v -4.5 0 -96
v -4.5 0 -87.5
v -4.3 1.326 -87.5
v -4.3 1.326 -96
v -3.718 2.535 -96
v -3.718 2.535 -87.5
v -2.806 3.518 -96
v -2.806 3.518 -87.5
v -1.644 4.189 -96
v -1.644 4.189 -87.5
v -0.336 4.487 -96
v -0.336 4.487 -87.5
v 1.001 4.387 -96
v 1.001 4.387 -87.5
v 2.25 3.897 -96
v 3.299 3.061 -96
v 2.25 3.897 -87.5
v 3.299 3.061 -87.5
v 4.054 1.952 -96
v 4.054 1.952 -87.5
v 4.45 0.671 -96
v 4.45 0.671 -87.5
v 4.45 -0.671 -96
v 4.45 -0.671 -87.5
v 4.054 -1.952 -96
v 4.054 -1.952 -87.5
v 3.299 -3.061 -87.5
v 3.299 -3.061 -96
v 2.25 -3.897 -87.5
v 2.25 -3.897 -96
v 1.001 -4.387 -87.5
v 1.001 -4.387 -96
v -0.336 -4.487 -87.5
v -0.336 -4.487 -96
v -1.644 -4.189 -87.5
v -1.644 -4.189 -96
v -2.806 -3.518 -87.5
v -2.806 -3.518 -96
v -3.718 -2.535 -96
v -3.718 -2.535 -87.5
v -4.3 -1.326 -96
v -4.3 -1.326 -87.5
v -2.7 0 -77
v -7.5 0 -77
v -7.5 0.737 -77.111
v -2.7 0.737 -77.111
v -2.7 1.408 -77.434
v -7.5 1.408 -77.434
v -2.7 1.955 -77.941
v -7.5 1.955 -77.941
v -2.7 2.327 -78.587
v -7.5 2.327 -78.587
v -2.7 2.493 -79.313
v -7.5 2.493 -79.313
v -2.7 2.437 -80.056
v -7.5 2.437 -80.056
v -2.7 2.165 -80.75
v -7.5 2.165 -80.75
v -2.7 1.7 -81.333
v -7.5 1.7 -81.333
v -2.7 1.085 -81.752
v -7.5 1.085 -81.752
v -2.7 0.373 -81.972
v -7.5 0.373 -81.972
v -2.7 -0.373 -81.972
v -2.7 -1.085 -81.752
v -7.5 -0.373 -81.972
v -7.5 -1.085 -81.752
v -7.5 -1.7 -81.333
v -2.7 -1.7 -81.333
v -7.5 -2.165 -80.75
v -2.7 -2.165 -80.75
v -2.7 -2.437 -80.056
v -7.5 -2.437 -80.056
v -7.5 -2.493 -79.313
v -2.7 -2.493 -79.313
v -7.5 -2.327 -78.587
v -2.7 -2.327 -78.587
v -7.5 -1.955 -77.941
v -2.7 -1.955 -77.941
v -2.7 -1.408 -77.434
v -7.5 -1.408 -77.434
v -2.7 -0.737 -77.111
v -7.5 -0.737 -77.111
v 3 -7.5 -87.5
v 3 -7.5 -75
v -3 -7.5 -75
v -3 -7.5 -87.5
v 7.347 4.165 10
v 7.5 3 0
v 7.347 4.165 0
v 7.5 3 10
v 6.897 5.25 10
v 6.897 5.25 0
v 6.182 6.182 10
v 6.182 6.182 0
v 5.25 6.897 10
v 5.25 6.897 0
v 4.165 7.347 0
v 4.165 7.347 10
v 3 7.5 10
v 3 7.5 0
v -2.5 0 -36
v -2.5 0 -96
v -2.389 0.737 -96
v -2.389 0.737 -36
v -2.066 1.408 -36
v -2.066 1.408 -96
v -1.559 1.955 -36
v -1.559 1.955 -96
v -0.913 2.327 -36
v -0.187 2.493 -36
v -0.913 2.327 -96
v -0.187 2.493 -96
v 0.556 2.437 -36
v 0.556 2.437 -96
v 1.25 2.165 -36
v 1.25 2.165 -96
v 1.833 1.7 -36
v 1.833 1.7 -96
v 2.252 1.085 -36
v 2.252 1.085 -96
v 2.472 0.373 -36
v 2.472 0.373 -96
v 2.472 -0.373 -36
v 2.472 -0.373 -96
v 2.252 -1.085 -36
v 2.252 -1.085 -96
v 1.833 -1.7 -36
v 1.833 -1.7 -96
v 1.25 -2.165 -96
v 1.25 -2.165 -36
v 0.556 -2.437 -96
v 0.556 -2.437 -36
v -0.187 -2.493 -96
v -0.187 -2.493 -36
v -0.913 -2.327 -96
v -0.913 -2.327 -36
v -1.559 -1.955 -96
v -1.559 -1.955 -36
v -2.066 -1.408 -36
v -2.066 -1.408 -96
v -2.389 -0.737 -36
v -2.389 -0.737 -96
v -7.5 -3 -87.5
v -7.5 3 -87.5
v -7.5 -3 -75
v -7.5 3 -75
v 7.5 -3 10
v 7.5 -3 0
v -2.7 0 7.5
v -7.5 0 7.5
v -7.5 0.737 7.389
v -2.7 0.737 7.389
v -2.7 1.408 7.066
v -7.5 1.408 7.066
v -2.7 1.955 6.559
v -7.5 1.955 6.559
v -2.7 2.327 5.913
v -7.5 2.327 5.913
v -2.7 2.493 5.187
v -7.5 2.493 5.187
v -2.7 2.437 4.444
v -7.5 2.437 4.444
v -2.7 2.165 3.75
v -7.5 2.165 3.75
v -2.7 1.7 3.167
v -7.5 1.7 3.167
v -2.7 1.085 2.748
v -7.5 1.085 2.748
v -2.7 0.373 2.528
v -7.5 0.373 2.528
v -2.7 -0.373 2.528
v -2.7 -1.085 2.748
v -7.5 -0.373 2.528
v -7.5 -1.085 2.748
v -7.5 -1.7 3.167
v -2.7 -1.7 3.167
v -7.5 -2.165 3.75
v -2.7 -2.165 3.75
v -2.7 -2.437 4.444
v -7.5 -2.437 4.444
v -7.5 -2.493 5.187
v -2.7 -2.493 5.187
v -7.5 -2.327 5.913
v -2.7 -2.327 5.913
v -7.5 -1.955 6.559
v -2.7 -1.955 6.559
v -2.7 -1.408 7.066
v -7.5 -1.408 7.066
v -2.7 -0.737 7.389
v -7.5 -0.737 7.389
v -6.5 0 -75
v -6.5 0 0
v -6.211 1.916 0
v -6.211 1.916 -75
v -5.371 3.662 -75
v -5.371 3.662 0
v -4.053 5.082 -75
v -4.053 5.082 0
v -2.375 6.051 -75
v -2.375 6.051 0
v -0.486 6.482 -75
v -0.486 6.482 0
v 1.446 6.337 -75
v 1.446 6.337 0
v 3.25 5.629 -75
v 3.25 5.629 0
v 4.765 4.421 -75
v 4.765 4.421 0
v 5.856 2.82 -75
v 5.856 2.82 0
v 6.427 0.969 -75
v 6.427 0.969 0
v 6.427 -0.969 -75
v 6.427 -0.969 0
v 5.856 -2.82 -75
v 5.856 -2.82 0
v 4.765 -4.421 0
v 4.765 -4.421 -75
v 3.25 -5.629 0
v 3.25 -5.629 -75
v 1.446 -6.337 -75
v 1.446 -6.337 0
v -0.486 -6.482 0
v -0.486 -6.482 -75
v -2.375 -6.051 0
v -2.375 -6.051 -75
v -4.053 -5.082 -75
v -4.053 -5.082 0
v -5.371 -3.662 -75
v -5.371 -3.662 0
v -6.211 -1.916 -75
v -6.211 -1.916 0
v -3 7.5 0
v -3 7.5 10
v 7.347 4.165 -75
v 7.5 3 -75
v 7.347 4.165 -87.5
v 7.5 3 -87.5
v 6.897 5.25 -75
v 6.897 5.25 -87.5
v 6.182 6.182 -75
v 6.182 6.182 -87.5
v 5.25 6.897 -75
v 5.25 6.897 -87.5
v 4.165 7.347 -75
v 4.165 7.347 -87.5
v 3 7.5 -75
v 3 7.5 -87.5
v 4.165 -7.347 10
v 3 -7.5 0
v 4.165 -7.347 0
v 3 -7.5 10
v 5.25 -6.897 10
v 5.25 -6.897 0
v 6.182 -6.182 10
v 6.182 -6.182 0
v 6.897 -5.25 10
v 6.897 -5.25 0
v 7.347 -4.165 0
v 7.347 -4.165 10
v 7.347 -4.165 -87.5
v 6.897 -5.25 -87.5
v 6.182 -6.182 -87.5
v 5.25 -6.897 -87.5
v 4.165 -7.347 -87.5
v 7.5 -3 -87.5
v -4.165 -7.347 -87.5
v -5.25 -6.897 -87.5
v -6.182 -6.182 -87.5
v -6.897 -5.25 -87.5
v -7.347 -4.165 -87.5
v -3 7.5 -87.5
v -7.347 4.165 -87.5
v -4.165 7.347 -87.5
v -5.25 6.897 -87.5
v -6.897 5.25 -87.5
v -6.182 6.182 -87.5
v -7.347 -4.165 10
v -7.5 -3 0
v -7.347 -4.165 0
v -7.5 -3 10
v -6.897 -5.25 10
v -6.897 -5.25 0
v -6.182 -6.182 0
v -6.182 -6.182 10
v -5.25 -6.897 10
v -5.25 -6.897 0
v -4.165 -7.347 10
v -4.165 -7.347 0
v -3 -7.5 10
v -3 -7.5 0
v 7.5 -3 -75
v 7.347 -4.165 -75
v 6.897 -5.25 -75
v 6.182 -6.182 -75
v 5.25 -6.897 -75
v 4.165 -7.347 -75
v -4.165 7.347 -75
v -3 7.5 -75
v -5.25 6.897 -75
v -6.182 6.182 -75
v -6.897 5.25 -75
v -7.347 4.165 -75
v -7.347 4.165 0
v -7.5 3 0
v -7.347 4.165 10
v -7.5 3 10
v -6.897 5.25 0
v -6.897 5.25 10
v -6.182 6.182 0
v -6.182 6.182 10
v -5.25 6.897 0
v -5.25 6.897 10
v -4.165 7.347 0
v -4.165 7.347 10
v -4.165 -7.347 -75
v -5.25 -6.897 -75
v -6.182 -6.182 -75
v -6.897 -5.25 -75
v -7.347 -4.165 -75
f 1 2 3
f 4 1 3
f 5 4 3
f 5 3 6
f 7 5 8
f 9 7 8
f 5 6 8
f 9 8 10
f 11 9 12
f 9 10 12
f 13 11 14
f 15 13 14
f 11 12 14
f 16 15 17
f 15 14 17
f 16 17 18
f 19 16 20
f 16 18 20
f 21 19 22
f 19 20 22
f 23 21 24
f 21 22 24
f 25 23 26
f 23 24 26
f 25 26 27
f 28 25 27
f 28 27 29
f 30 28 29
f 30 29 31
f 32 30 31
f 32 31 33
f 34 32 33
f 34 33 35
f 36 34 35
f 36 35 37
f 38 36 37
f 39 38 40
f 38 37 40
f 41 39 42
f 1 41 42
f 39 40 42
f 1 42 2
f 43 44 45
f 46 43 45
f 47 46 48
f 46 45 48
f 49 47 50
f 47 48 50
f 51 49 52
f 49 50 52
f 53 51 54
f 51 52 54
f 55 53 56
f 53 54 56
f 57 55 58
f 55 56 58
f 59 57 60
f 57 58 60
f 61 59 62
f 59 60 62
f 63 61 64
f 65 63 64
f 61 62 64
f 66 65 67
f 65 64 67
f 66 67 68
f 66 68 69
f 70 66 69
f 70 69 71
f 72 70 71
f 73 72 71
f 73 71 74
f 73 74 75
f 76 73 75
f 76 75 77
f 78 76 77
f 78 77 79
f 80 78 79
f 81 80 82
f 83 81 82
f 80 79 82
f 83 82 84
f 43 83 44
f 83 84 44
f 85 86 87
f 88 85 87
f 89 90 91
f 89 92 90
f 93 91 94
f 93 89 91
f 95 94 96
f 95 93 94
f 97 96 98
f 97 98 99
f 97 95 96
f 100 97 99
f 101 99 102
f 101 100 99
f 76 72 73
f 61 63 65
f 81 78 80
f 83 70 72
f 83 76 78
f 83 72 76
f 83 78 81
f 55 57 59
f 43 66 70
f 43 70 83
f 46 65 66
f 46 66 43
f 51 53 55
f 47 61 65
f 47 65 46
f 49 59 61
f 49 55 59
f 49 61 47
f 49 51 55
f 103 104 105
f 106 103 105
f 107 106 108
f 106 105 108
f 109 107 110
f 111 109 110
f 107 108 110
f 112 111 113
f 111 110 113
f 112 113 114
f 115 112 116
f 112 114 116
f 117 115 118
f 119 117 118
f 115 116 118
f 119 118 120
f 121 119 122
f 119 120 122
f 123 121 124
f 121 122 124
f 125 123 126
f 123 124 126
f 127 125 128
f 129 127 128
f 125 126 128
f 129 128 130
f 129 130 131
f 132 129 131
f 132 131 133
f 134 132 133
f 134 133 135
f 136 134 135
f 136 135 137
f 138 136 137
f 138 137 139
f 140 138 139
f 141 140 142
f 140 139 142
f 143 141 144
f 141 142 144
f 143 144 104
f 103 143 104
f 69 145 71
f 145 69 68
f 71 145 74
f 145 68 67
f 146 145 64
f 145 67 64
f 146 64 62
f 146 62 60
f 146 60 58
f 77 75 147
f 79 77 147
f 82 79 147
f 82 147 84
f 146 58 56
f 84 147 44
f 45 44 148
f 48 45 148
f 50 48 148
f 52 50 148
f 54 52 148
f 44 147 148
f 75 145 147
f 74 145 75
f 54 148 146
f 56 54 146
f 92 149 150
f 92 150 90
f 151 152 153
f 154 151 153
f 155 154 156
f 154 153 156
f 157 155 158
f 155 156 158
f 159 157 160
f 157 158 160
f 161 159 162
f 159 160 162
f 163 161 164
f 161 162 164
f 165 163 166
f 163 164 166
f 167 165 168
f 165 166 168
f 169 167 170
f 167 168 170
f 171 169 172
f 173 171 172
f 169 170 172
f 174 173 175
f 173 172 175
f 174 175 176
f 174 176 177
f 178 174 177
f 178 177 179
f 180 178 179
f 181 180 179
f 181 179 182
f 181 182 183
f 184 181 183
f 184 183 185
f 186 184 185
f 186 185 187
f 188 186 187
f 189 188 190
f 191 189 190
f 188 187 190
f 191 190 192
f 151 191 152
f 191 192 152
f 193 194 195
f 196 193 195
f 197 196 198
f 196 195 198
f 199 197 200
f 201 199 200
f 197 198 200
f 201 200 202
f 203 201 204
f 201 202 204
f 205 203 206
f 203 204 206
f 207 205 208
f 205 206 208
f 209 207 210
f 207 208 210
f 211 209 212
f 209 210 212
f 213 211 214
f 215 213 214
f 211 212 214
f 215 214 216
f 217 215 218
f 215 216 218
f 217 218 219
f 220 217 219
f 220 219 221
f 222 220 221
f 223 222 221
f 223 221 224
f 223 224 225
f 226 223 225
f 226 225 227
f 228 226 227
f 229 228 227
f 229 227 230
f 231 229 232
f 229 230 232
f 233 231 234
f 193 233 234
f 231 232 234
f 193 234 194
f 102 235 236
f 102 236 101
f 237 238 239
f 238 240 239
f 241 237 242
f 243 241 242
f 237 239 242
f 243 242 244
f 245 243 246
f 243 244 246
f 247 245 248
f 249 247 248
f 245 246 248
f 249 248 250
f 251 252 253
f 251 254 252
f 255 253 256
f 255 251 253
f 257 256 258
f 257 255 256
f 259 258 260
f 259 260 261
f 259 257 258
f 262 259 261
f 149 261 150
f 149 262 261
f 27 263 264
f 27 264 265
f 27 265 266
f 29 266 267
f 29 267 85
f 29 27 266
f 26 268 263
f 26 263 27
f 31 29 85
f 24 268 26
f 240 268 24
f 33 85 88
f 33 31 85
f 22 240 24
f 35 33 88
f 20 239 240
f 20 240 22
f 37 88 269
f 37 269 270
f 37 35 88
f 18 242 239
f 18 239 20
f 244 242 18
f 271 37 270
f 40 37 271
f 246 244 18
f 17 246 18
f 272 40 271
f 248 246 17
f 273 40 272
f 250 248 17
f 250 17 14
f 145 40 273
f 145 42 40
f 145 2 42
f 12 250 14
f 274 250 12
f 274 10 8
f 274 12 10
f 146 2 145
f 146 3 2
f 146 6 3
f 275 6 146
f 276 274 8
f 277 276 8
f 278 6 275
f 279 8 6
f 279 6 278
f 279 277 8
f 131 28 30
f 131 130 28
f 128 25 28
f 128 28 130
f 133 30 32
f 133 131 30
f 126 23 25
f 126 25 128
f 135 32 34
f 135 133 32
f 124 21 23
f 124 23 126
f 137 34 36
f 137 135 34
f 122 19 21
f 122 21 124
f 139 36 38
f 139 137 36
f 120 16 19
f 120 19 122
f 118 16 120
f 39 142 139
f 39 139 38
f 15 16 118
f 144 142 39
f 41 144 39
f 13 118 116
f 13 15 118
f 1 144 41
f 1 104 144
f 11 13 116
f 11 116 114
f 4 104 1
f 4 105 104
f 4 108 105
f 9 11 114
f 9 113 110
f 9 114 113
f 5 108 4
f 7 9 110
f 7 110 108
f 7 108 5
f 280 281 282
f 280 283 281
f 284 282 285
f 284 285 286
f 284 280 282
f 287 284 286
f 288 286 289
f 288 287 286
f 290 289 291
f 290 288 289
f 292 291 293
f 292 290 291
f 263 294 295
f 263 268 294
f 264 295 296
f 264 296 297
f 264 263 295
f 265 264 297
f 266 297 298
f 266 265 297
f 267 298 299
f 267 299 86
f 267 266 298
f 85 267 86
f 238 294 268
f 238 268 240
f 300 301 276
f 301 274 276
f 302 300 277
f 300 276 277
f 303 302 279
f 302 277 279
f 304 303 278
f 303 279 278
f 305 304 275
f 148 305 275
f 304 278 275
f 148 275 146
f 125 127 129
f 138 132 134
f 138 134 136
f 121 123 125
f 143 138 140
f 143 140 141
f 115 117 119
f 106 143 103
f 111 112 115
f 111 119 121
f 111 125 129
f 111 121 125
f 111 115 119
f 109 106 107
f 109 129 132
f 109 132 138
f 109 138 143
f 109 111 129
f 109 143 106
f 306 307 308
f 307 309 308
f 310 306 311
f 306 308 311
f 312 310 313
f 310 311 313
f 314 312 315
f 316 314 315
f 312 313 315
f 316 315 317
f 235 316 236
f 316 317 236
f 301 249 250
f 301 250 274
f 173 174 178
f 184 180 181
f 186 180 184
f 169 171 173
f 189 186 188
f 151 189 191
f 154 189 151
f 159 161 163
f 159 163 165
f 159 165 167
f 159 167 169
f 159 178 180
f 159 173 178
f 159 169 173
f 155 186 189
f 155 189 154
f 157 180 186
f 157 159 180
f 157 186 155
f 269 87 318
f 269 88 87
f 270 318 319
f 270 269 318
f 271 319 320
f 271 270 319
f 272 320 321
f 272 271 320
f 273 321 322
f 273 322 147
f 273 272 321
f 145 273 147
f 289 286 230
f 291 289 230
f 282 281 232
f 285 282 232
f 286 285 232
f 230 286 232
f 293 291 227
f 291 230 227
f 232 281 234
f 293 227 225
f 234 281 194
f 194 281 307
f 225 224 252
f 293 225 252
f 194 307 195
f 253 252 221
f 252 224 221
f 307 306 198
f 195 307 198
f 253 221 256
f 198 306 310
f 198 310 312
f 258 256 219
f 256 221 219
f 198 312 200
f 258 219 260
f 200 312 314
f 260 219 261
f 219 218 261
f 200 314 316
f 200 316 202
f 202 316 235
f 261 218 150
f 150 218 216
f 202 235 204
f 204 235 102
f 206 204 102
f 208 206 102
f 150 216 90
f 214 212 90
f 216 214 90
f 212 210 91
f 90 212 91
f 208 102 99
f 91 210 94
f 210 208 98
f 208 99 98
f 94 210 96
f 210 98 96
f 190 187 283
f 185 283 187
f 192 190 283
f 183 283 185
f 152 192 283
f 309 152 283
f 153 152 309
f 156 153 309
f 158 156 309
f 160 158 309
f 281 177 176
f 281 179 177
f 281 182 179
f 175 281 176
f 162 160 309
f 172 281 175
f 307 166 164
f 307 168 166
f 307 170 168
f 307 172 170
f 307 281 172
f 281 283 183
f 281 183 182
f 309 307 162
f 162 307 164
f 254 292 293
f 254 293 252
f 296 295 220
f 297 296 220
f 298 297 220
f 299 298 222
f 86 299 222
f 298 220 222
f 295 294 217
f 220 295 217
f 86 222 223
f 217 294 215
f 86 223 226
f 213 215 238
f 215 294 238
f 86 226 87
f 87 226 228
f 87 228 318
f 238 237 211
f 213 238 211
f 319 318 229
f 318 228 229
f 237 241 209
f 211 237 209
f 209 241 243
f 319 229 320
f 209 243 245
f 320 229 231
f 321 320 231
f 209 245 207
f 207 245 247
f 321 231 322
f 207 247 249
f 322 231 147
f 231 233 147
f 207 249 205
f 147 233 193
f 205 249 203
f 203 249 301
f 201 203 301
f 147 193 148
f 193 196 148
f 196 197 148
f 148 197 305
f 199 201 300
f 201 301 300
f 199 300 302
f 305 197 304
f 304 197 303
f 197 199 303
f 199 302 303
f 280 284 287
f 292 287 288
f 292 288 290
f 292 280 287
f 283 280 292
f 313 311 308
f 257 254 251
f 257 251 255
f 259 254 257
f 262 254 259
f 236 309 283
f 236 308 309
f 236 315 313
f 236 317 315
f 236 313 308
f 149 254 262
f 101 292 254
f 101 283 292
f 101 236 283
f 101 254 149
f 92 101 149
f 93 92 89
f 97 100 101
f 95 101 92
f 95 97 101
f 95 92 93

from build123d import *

# Parameters (mm, degrees)
SKETCH_1_W          = 15
SKETCH_1_H          = 15
EXTRUDE_1_DEPTH     = 10
FILLET_1_R          = 4.5
SKETCH_2_R          = 2.5
CUT_EXTRUDE_1_DEPTH = 4.8
SKETCH_4_R          = 6.5
EXTRUDE_2_DEPTH     = 75
SKETCH_6_W          = 15
SKETCH_6_H          = 15
EXTRUDE_3_DEPTH     = 12.5
FILLET_2_R          = 4.5
SKETCH_7_R          = 4.5
EXTRUDE_4_DEPTH     = 8.5
SKETCH_13_R         = 2.5
CUT_EXTRUDE_2_DEPTH = 4.8
SKETCH_16_R         = 2.5
CUT_EXTRUDE_6_DEPTH = 60


with BuildPart() as part:
    # 草图1 → 凸台-拉伸1 (new body)
    with BuildSketch(Plane.XY):
        Rectangle(SKETCH_1_W, SKETCH_1_H)
    extrude(amount=EXTRUDE_1_DEPTH)

    # 圆角1
    fillet_1_edges = [part.edges().sort_by_distance(p)[0] for p in [
        (7.5, -7.5, 5),
        (-7.5, -7.5, 5),
        (-7.5, 7.5, 5),
        (7.5, 7.5, 5),
    ]]
    fillet(fillet_1_edges, radius=FILLET_1_R)

    # 草图2 → 切除-拉伸1 (cut)
    with BuildSketch(Plane.ZY.offset(7.5)):
        with Locations((5, 0)):
            Circle(SKETCH_2_R)
    extrude(amount=-CUT_EXTRUDE_1_DEPTH, mode=Mode.SUBTRACT)

    # 草图4 → 凸台-拉伸2 (add)
    with BuildSketch(Plane(origin=(0, 0, 0), x_dir=(-1, 0, 0), z_dir=(0, 0, -1))):
        Circle(SKETCH_4_R)
    extrude(amount=EXTRUDE_2_DEPTH)

    # 草图6 → 凸台-拉伸3 (add)
    with BuildSketch(Plane(origin=(0, 0, -75), x_dir=(-1, 0, 0), z_dir=(0, 0, -1))):
        Rectangle(SKETCH_6_W, SKETCH_6_H)
    extrude(amount=EXTRUDE_3_DEPTH)

    # 圆角2
    fillet_2_edges = [part.edges().sort_by_distance(p)[0] for p in [
        (-7.5, -7.5, -81.25),
        (-7.5, 7.5, -81.25),
        (7.5, 7.5, -81.25),
        (7.5, -7.5, -81.25),
    ]]
    fillet(fillet_2_edges, radius=FILLET_2_R)

    # 草图7 → 凸台-拉伸4 (add)
    with BuildSketch(Plane(origin=(0, 0, -87.5), x_dir=(-1, 0, 0), z_dir=(0, 0, -1))):
        Circle(SKETCH_7_R)
    extrude(amount=EXTRUDE_4_DEPTH)

    # 草图13 → 切除-拉伸2 (cut)
    with BuildSketch(Plane.ZY.offset(7.5)):
        with Locations((-79.5, 0)):
            Circle(SKETCH_13_R)
    extrude(amount=-CUT_EXTRUDE_2_DEPTH, mode=Mode.SUBTRACT)

    # 草图16 → 切除-拉伸6 (cut)
    with BuildSketch(Plane(origin=(0, 0, -96), x_dir=(-1, 0, 0), z_dir=(0, 0, -1))):
        Circle(SKETCH_16_R)
    extrude(amount=-CUT_EXTRUDE_6_DEPTH, mode=Mode.SUBTRACT)


solid = part.part
